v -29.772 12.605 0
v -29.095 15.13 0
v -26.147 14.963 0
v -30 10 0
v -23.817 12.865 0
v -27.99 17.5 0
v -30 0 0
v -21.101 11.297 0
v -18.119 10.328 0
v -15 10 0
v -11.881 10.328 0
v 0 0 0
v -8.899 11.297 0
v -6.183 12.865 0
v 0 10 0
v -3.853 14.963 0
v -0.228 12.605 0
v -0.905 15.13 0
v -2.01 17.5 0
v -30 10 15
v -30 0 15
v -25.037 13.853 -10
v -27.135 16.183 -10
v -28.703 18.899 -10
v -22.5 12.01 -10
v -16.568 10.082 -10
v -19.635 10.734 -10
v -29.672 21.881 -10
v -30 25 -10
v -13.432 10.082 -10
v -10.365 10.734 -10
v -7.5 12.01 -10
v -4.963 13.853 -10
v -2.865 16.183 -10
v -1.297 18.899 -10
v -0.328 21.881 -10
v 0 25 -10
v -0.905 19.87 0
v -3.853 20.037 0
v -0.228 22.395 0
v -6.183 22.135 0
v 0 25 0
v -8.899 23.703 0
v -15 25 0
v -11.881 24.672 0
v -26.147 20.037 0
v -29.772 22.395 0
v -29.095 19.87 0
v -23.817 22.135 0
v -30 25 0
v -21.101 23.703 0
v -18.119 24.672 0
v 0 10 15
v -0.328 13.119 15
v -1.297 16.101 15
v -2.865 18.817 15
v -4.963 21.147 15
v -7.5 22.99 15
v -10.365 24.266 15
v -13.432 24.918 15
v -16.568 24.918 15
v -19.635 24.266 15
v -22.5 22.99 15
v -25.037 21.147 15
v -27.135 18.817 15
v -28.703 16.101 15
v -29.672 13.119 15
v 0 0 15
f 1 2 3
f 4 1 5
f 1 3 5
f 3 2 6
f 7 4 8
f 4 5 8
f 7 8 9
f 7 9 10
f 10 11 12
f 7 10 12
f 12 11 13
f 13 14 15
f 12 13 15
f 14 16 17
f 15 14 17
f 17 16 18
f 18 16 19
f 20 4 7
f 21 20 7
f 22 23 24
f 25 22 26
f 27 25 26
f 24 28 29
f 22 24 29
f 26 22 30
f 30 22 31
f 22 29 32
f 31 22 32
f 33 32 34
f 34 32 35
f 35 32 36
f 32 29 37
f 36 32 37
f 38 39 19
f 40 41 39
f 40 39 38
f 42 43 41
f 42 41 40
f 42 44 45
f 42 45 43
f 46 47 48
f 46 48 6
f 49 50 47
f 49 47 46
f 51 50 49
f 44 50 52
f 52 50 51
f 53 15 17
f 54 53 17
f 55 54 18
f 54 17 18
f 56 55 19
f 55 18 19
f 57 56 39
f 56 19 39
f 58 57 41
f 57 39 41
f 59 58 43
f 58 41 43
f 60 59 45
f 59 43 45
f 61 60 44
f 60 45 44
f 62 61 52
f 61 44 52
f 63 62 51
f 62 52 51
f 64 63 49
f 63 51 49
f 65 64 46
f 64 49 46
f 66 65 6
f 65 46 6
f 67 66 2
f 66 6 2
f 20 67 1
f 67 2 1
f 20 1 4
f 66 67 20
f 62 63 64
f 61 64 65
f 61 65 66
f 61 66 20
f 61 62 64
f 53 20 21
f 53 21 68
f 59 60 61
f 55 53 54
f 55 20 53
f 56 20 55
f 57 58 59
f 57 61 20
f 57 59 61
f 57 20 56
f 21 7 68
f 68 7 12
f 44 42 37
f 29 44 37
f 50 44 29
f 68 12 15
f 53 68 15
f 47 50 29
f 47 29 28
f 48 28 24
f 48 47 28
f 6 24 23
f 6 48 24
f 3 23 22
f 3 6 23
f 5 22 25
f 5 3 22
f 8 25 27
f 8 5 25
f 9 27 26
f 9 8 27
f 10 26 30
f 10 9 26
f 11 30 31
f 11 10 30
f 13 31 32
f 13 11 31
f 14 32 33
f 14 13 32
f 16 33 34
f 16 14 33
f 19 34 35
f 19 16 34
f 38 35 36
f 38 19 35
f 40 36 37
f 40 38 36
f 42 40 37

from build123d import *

# Parameters (mm, degrees)
BOSS_EXTRUDE2_DEPTH = 15
BOSS_EXTRUDE3_DEPTH = 10


with BuildPart() as part:
    # Sketch1 → Boss-Extrude2 (new body)
    with BuildSketch(Plane.XY):
        with BuildLine():
            Line((-30, 10), (-30, 0))
            Line((-30, 0), (0, 0))
            Line((0, 0), (0, 10))
            ThreePointArc((0, 10), (-15, 25), (-30, 10))
        make_face()
    extrude(amount=BOSS_EXTRUDE2_DEPTH)

    # Sketch2 → Boss-Extrude3 (add)
    with BuildSketch(Plane(origin=(0, 0, 0), x_dir=(-1, 0, 0), z_dir=(0, 0, -1))):
        with BuildLine():
            Line((0, 25), (30, 25))
            ThreePointArc((30, 25), (15, 10), (0, 25))
        make_face()
    extrude(amount=BOSS_EXTRUDE3_DEPTH)


solid = part.part
